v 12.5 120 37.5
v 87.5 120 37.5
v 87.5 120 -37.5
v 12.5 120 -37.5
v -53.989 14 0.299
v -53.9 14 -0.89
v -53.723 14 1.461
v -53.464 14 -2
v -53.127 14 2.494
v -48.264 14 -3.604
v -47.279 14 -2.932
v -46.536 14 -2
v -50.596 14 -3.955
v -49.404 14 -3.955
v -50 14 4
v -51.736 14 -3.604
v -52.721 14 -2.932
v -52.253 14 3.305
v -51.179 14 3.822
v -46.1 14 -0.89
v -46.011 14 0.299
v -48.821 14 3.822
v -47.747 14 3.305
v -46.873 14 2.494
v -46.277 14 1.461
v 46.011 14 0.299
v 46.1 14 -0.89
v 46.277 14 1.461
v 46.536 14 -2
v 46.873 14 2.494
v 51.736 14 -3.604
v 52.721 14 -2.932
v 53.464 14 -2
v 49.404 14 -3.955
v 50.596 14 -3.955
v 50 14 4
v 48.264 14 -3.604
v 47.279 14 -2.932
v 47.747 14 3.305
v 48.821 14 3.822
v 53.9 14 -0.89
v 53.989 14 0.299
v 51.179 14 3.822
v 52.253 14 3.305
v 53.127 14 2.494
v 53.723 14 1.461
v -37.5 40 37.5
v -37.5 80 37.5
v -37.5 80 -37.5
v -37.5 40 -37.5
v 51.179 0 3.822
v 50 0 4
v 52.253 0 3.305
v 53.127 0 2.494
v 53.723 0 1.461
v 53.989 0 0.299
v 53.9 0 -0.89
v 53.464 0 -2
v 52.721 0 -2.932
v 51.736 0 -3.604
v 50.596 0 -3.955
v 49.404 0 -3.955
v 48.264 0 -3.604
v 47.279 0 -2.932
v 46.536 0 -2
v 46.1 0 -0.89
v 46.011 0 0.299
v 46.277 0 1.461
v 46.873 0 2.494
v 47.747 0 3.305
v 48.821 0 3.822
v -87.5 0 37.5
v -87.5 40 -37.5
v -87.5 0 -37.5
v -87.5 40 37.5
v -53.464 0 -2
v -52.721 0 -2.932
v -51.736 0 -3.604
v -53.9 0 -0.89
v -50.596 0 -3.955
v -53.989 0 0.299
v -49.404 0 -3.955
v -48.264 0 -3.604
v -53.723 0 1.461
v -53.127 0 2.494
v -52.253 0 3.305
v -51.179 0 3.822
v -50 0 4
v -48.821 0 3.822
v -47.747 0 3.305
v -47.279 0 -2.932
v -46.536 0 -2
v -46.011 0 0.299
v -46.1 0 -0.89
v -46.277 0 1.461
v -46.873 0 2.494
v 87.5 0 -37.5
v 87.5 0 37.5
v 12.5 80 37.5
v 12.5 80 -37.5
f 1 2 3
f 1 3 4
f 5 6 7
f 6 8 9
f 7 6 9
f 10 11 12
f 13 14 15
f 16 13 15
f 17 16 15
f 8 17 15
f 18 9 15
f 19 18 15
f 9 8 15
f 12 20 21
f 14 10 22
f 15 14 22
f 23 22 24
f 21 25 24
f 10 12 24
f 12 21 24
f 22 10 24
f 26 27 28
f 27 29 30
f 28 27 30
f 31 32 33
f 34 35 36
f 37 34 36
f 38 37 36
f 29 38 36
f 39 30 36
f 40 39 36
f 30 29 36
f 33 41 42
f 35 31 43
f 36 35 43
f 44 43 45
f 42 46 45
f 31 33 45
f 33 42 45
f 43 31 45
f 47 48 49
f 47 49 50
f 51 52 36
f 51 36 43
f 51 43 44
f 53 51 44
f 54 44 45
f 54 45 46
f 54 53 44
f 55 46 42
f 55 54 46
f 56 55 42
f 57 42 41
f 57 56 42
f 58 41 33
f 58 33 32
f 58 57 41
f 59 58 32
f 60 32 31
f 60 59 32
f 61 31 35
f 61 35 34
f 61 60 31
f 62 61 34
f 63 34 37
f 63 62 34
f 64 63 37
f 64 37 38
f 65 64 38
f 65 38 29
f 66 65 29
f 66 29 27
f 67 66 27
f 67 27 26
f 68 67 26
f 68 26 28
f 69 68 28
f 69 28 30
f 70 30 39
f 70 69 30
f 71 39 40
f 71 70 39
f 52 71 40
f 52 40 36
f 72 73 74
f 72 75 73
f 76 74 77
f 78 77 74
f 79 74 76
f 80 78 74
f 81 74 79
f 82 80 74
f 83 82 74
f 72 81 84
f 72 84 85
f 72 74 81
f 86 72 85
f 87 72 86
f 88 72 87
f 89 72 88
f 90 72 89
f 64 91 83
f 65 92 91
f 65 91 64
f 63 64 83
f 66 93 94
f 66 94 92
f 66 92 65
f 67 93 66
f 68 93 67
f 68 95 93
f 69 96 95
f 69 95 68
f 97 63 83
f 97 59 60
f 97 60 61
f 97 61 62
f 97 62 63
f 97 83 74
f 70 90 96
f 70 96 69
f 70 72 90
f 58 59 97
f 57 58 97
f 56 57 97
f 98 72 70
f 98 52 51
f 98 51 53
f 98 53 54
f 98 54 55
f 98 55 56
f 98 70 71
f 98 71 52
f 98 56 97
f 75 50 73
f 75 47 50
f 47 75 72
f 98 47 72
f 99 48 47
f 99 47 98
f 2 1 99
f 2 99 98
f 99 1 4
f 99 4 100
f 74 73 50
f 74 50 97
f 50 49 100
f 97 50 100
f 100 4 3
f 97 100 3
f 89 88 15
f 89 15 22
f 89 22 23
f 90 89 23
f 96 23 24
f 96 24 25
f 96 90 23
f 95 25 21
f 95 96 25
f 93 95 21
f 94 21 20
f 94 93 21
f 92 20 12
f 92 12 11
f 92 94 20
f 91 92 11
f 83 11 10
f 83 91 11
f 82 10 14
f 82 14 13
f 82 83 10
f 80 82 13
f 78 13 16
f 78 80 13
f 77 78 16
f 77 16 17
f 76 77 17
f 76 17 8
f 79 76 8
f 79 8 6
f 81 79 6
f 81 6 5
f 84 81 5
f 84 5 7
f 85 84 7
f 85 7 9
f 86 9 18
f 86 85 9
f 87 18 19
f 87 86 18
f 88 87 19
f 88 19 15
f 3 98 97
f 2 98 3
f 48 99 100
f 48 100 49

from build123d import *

# Parameters (mm, degrees)
ESCALERA_DEPTH             = 37.5
CROQUIS_AGUJEROS_MONTAJE_R = 4
AGUJERO_INSERTO_M6_DEPTH   = 14


with BuildPart() as part:
    # Croquis_perfil_escalera → Escalera (new, symmetric)
    with BuildSketch(Plane.XY):
        Polygon((-87.5, 0), (87.5, 0), (87.5, 120), (12.5, 120), (12.5, 80), (-37.5, 80), (-37.5, 40), (-87.5, 40), align=None)
    extrude(amount=ESCALERA_DEPTH, both=True)

    # Croquis_agujeros_montaje → Agujero_inserto_M6 (cut)
    with BuildSketch(Plane(origin=(0, 0, 0), x_dir=(1, 0, 0), z_dir=(0, 1, 0))):
        with Locations(Location((-50, 0, 0), (0, 0, 270))):
            Circle(CROQUIS_AGUJEROS_MONTAJE_R)
        with Locations(Location((50, 0, 0), (0, 0, 270))):
            Circle(CROQUIS_AGUJEROS_MONTAJE_R)
    extrude(amount=AGUJERO_INSERTO_M6_DEPTH, mode=Mode.SUBTRACT)


solid = part.part
